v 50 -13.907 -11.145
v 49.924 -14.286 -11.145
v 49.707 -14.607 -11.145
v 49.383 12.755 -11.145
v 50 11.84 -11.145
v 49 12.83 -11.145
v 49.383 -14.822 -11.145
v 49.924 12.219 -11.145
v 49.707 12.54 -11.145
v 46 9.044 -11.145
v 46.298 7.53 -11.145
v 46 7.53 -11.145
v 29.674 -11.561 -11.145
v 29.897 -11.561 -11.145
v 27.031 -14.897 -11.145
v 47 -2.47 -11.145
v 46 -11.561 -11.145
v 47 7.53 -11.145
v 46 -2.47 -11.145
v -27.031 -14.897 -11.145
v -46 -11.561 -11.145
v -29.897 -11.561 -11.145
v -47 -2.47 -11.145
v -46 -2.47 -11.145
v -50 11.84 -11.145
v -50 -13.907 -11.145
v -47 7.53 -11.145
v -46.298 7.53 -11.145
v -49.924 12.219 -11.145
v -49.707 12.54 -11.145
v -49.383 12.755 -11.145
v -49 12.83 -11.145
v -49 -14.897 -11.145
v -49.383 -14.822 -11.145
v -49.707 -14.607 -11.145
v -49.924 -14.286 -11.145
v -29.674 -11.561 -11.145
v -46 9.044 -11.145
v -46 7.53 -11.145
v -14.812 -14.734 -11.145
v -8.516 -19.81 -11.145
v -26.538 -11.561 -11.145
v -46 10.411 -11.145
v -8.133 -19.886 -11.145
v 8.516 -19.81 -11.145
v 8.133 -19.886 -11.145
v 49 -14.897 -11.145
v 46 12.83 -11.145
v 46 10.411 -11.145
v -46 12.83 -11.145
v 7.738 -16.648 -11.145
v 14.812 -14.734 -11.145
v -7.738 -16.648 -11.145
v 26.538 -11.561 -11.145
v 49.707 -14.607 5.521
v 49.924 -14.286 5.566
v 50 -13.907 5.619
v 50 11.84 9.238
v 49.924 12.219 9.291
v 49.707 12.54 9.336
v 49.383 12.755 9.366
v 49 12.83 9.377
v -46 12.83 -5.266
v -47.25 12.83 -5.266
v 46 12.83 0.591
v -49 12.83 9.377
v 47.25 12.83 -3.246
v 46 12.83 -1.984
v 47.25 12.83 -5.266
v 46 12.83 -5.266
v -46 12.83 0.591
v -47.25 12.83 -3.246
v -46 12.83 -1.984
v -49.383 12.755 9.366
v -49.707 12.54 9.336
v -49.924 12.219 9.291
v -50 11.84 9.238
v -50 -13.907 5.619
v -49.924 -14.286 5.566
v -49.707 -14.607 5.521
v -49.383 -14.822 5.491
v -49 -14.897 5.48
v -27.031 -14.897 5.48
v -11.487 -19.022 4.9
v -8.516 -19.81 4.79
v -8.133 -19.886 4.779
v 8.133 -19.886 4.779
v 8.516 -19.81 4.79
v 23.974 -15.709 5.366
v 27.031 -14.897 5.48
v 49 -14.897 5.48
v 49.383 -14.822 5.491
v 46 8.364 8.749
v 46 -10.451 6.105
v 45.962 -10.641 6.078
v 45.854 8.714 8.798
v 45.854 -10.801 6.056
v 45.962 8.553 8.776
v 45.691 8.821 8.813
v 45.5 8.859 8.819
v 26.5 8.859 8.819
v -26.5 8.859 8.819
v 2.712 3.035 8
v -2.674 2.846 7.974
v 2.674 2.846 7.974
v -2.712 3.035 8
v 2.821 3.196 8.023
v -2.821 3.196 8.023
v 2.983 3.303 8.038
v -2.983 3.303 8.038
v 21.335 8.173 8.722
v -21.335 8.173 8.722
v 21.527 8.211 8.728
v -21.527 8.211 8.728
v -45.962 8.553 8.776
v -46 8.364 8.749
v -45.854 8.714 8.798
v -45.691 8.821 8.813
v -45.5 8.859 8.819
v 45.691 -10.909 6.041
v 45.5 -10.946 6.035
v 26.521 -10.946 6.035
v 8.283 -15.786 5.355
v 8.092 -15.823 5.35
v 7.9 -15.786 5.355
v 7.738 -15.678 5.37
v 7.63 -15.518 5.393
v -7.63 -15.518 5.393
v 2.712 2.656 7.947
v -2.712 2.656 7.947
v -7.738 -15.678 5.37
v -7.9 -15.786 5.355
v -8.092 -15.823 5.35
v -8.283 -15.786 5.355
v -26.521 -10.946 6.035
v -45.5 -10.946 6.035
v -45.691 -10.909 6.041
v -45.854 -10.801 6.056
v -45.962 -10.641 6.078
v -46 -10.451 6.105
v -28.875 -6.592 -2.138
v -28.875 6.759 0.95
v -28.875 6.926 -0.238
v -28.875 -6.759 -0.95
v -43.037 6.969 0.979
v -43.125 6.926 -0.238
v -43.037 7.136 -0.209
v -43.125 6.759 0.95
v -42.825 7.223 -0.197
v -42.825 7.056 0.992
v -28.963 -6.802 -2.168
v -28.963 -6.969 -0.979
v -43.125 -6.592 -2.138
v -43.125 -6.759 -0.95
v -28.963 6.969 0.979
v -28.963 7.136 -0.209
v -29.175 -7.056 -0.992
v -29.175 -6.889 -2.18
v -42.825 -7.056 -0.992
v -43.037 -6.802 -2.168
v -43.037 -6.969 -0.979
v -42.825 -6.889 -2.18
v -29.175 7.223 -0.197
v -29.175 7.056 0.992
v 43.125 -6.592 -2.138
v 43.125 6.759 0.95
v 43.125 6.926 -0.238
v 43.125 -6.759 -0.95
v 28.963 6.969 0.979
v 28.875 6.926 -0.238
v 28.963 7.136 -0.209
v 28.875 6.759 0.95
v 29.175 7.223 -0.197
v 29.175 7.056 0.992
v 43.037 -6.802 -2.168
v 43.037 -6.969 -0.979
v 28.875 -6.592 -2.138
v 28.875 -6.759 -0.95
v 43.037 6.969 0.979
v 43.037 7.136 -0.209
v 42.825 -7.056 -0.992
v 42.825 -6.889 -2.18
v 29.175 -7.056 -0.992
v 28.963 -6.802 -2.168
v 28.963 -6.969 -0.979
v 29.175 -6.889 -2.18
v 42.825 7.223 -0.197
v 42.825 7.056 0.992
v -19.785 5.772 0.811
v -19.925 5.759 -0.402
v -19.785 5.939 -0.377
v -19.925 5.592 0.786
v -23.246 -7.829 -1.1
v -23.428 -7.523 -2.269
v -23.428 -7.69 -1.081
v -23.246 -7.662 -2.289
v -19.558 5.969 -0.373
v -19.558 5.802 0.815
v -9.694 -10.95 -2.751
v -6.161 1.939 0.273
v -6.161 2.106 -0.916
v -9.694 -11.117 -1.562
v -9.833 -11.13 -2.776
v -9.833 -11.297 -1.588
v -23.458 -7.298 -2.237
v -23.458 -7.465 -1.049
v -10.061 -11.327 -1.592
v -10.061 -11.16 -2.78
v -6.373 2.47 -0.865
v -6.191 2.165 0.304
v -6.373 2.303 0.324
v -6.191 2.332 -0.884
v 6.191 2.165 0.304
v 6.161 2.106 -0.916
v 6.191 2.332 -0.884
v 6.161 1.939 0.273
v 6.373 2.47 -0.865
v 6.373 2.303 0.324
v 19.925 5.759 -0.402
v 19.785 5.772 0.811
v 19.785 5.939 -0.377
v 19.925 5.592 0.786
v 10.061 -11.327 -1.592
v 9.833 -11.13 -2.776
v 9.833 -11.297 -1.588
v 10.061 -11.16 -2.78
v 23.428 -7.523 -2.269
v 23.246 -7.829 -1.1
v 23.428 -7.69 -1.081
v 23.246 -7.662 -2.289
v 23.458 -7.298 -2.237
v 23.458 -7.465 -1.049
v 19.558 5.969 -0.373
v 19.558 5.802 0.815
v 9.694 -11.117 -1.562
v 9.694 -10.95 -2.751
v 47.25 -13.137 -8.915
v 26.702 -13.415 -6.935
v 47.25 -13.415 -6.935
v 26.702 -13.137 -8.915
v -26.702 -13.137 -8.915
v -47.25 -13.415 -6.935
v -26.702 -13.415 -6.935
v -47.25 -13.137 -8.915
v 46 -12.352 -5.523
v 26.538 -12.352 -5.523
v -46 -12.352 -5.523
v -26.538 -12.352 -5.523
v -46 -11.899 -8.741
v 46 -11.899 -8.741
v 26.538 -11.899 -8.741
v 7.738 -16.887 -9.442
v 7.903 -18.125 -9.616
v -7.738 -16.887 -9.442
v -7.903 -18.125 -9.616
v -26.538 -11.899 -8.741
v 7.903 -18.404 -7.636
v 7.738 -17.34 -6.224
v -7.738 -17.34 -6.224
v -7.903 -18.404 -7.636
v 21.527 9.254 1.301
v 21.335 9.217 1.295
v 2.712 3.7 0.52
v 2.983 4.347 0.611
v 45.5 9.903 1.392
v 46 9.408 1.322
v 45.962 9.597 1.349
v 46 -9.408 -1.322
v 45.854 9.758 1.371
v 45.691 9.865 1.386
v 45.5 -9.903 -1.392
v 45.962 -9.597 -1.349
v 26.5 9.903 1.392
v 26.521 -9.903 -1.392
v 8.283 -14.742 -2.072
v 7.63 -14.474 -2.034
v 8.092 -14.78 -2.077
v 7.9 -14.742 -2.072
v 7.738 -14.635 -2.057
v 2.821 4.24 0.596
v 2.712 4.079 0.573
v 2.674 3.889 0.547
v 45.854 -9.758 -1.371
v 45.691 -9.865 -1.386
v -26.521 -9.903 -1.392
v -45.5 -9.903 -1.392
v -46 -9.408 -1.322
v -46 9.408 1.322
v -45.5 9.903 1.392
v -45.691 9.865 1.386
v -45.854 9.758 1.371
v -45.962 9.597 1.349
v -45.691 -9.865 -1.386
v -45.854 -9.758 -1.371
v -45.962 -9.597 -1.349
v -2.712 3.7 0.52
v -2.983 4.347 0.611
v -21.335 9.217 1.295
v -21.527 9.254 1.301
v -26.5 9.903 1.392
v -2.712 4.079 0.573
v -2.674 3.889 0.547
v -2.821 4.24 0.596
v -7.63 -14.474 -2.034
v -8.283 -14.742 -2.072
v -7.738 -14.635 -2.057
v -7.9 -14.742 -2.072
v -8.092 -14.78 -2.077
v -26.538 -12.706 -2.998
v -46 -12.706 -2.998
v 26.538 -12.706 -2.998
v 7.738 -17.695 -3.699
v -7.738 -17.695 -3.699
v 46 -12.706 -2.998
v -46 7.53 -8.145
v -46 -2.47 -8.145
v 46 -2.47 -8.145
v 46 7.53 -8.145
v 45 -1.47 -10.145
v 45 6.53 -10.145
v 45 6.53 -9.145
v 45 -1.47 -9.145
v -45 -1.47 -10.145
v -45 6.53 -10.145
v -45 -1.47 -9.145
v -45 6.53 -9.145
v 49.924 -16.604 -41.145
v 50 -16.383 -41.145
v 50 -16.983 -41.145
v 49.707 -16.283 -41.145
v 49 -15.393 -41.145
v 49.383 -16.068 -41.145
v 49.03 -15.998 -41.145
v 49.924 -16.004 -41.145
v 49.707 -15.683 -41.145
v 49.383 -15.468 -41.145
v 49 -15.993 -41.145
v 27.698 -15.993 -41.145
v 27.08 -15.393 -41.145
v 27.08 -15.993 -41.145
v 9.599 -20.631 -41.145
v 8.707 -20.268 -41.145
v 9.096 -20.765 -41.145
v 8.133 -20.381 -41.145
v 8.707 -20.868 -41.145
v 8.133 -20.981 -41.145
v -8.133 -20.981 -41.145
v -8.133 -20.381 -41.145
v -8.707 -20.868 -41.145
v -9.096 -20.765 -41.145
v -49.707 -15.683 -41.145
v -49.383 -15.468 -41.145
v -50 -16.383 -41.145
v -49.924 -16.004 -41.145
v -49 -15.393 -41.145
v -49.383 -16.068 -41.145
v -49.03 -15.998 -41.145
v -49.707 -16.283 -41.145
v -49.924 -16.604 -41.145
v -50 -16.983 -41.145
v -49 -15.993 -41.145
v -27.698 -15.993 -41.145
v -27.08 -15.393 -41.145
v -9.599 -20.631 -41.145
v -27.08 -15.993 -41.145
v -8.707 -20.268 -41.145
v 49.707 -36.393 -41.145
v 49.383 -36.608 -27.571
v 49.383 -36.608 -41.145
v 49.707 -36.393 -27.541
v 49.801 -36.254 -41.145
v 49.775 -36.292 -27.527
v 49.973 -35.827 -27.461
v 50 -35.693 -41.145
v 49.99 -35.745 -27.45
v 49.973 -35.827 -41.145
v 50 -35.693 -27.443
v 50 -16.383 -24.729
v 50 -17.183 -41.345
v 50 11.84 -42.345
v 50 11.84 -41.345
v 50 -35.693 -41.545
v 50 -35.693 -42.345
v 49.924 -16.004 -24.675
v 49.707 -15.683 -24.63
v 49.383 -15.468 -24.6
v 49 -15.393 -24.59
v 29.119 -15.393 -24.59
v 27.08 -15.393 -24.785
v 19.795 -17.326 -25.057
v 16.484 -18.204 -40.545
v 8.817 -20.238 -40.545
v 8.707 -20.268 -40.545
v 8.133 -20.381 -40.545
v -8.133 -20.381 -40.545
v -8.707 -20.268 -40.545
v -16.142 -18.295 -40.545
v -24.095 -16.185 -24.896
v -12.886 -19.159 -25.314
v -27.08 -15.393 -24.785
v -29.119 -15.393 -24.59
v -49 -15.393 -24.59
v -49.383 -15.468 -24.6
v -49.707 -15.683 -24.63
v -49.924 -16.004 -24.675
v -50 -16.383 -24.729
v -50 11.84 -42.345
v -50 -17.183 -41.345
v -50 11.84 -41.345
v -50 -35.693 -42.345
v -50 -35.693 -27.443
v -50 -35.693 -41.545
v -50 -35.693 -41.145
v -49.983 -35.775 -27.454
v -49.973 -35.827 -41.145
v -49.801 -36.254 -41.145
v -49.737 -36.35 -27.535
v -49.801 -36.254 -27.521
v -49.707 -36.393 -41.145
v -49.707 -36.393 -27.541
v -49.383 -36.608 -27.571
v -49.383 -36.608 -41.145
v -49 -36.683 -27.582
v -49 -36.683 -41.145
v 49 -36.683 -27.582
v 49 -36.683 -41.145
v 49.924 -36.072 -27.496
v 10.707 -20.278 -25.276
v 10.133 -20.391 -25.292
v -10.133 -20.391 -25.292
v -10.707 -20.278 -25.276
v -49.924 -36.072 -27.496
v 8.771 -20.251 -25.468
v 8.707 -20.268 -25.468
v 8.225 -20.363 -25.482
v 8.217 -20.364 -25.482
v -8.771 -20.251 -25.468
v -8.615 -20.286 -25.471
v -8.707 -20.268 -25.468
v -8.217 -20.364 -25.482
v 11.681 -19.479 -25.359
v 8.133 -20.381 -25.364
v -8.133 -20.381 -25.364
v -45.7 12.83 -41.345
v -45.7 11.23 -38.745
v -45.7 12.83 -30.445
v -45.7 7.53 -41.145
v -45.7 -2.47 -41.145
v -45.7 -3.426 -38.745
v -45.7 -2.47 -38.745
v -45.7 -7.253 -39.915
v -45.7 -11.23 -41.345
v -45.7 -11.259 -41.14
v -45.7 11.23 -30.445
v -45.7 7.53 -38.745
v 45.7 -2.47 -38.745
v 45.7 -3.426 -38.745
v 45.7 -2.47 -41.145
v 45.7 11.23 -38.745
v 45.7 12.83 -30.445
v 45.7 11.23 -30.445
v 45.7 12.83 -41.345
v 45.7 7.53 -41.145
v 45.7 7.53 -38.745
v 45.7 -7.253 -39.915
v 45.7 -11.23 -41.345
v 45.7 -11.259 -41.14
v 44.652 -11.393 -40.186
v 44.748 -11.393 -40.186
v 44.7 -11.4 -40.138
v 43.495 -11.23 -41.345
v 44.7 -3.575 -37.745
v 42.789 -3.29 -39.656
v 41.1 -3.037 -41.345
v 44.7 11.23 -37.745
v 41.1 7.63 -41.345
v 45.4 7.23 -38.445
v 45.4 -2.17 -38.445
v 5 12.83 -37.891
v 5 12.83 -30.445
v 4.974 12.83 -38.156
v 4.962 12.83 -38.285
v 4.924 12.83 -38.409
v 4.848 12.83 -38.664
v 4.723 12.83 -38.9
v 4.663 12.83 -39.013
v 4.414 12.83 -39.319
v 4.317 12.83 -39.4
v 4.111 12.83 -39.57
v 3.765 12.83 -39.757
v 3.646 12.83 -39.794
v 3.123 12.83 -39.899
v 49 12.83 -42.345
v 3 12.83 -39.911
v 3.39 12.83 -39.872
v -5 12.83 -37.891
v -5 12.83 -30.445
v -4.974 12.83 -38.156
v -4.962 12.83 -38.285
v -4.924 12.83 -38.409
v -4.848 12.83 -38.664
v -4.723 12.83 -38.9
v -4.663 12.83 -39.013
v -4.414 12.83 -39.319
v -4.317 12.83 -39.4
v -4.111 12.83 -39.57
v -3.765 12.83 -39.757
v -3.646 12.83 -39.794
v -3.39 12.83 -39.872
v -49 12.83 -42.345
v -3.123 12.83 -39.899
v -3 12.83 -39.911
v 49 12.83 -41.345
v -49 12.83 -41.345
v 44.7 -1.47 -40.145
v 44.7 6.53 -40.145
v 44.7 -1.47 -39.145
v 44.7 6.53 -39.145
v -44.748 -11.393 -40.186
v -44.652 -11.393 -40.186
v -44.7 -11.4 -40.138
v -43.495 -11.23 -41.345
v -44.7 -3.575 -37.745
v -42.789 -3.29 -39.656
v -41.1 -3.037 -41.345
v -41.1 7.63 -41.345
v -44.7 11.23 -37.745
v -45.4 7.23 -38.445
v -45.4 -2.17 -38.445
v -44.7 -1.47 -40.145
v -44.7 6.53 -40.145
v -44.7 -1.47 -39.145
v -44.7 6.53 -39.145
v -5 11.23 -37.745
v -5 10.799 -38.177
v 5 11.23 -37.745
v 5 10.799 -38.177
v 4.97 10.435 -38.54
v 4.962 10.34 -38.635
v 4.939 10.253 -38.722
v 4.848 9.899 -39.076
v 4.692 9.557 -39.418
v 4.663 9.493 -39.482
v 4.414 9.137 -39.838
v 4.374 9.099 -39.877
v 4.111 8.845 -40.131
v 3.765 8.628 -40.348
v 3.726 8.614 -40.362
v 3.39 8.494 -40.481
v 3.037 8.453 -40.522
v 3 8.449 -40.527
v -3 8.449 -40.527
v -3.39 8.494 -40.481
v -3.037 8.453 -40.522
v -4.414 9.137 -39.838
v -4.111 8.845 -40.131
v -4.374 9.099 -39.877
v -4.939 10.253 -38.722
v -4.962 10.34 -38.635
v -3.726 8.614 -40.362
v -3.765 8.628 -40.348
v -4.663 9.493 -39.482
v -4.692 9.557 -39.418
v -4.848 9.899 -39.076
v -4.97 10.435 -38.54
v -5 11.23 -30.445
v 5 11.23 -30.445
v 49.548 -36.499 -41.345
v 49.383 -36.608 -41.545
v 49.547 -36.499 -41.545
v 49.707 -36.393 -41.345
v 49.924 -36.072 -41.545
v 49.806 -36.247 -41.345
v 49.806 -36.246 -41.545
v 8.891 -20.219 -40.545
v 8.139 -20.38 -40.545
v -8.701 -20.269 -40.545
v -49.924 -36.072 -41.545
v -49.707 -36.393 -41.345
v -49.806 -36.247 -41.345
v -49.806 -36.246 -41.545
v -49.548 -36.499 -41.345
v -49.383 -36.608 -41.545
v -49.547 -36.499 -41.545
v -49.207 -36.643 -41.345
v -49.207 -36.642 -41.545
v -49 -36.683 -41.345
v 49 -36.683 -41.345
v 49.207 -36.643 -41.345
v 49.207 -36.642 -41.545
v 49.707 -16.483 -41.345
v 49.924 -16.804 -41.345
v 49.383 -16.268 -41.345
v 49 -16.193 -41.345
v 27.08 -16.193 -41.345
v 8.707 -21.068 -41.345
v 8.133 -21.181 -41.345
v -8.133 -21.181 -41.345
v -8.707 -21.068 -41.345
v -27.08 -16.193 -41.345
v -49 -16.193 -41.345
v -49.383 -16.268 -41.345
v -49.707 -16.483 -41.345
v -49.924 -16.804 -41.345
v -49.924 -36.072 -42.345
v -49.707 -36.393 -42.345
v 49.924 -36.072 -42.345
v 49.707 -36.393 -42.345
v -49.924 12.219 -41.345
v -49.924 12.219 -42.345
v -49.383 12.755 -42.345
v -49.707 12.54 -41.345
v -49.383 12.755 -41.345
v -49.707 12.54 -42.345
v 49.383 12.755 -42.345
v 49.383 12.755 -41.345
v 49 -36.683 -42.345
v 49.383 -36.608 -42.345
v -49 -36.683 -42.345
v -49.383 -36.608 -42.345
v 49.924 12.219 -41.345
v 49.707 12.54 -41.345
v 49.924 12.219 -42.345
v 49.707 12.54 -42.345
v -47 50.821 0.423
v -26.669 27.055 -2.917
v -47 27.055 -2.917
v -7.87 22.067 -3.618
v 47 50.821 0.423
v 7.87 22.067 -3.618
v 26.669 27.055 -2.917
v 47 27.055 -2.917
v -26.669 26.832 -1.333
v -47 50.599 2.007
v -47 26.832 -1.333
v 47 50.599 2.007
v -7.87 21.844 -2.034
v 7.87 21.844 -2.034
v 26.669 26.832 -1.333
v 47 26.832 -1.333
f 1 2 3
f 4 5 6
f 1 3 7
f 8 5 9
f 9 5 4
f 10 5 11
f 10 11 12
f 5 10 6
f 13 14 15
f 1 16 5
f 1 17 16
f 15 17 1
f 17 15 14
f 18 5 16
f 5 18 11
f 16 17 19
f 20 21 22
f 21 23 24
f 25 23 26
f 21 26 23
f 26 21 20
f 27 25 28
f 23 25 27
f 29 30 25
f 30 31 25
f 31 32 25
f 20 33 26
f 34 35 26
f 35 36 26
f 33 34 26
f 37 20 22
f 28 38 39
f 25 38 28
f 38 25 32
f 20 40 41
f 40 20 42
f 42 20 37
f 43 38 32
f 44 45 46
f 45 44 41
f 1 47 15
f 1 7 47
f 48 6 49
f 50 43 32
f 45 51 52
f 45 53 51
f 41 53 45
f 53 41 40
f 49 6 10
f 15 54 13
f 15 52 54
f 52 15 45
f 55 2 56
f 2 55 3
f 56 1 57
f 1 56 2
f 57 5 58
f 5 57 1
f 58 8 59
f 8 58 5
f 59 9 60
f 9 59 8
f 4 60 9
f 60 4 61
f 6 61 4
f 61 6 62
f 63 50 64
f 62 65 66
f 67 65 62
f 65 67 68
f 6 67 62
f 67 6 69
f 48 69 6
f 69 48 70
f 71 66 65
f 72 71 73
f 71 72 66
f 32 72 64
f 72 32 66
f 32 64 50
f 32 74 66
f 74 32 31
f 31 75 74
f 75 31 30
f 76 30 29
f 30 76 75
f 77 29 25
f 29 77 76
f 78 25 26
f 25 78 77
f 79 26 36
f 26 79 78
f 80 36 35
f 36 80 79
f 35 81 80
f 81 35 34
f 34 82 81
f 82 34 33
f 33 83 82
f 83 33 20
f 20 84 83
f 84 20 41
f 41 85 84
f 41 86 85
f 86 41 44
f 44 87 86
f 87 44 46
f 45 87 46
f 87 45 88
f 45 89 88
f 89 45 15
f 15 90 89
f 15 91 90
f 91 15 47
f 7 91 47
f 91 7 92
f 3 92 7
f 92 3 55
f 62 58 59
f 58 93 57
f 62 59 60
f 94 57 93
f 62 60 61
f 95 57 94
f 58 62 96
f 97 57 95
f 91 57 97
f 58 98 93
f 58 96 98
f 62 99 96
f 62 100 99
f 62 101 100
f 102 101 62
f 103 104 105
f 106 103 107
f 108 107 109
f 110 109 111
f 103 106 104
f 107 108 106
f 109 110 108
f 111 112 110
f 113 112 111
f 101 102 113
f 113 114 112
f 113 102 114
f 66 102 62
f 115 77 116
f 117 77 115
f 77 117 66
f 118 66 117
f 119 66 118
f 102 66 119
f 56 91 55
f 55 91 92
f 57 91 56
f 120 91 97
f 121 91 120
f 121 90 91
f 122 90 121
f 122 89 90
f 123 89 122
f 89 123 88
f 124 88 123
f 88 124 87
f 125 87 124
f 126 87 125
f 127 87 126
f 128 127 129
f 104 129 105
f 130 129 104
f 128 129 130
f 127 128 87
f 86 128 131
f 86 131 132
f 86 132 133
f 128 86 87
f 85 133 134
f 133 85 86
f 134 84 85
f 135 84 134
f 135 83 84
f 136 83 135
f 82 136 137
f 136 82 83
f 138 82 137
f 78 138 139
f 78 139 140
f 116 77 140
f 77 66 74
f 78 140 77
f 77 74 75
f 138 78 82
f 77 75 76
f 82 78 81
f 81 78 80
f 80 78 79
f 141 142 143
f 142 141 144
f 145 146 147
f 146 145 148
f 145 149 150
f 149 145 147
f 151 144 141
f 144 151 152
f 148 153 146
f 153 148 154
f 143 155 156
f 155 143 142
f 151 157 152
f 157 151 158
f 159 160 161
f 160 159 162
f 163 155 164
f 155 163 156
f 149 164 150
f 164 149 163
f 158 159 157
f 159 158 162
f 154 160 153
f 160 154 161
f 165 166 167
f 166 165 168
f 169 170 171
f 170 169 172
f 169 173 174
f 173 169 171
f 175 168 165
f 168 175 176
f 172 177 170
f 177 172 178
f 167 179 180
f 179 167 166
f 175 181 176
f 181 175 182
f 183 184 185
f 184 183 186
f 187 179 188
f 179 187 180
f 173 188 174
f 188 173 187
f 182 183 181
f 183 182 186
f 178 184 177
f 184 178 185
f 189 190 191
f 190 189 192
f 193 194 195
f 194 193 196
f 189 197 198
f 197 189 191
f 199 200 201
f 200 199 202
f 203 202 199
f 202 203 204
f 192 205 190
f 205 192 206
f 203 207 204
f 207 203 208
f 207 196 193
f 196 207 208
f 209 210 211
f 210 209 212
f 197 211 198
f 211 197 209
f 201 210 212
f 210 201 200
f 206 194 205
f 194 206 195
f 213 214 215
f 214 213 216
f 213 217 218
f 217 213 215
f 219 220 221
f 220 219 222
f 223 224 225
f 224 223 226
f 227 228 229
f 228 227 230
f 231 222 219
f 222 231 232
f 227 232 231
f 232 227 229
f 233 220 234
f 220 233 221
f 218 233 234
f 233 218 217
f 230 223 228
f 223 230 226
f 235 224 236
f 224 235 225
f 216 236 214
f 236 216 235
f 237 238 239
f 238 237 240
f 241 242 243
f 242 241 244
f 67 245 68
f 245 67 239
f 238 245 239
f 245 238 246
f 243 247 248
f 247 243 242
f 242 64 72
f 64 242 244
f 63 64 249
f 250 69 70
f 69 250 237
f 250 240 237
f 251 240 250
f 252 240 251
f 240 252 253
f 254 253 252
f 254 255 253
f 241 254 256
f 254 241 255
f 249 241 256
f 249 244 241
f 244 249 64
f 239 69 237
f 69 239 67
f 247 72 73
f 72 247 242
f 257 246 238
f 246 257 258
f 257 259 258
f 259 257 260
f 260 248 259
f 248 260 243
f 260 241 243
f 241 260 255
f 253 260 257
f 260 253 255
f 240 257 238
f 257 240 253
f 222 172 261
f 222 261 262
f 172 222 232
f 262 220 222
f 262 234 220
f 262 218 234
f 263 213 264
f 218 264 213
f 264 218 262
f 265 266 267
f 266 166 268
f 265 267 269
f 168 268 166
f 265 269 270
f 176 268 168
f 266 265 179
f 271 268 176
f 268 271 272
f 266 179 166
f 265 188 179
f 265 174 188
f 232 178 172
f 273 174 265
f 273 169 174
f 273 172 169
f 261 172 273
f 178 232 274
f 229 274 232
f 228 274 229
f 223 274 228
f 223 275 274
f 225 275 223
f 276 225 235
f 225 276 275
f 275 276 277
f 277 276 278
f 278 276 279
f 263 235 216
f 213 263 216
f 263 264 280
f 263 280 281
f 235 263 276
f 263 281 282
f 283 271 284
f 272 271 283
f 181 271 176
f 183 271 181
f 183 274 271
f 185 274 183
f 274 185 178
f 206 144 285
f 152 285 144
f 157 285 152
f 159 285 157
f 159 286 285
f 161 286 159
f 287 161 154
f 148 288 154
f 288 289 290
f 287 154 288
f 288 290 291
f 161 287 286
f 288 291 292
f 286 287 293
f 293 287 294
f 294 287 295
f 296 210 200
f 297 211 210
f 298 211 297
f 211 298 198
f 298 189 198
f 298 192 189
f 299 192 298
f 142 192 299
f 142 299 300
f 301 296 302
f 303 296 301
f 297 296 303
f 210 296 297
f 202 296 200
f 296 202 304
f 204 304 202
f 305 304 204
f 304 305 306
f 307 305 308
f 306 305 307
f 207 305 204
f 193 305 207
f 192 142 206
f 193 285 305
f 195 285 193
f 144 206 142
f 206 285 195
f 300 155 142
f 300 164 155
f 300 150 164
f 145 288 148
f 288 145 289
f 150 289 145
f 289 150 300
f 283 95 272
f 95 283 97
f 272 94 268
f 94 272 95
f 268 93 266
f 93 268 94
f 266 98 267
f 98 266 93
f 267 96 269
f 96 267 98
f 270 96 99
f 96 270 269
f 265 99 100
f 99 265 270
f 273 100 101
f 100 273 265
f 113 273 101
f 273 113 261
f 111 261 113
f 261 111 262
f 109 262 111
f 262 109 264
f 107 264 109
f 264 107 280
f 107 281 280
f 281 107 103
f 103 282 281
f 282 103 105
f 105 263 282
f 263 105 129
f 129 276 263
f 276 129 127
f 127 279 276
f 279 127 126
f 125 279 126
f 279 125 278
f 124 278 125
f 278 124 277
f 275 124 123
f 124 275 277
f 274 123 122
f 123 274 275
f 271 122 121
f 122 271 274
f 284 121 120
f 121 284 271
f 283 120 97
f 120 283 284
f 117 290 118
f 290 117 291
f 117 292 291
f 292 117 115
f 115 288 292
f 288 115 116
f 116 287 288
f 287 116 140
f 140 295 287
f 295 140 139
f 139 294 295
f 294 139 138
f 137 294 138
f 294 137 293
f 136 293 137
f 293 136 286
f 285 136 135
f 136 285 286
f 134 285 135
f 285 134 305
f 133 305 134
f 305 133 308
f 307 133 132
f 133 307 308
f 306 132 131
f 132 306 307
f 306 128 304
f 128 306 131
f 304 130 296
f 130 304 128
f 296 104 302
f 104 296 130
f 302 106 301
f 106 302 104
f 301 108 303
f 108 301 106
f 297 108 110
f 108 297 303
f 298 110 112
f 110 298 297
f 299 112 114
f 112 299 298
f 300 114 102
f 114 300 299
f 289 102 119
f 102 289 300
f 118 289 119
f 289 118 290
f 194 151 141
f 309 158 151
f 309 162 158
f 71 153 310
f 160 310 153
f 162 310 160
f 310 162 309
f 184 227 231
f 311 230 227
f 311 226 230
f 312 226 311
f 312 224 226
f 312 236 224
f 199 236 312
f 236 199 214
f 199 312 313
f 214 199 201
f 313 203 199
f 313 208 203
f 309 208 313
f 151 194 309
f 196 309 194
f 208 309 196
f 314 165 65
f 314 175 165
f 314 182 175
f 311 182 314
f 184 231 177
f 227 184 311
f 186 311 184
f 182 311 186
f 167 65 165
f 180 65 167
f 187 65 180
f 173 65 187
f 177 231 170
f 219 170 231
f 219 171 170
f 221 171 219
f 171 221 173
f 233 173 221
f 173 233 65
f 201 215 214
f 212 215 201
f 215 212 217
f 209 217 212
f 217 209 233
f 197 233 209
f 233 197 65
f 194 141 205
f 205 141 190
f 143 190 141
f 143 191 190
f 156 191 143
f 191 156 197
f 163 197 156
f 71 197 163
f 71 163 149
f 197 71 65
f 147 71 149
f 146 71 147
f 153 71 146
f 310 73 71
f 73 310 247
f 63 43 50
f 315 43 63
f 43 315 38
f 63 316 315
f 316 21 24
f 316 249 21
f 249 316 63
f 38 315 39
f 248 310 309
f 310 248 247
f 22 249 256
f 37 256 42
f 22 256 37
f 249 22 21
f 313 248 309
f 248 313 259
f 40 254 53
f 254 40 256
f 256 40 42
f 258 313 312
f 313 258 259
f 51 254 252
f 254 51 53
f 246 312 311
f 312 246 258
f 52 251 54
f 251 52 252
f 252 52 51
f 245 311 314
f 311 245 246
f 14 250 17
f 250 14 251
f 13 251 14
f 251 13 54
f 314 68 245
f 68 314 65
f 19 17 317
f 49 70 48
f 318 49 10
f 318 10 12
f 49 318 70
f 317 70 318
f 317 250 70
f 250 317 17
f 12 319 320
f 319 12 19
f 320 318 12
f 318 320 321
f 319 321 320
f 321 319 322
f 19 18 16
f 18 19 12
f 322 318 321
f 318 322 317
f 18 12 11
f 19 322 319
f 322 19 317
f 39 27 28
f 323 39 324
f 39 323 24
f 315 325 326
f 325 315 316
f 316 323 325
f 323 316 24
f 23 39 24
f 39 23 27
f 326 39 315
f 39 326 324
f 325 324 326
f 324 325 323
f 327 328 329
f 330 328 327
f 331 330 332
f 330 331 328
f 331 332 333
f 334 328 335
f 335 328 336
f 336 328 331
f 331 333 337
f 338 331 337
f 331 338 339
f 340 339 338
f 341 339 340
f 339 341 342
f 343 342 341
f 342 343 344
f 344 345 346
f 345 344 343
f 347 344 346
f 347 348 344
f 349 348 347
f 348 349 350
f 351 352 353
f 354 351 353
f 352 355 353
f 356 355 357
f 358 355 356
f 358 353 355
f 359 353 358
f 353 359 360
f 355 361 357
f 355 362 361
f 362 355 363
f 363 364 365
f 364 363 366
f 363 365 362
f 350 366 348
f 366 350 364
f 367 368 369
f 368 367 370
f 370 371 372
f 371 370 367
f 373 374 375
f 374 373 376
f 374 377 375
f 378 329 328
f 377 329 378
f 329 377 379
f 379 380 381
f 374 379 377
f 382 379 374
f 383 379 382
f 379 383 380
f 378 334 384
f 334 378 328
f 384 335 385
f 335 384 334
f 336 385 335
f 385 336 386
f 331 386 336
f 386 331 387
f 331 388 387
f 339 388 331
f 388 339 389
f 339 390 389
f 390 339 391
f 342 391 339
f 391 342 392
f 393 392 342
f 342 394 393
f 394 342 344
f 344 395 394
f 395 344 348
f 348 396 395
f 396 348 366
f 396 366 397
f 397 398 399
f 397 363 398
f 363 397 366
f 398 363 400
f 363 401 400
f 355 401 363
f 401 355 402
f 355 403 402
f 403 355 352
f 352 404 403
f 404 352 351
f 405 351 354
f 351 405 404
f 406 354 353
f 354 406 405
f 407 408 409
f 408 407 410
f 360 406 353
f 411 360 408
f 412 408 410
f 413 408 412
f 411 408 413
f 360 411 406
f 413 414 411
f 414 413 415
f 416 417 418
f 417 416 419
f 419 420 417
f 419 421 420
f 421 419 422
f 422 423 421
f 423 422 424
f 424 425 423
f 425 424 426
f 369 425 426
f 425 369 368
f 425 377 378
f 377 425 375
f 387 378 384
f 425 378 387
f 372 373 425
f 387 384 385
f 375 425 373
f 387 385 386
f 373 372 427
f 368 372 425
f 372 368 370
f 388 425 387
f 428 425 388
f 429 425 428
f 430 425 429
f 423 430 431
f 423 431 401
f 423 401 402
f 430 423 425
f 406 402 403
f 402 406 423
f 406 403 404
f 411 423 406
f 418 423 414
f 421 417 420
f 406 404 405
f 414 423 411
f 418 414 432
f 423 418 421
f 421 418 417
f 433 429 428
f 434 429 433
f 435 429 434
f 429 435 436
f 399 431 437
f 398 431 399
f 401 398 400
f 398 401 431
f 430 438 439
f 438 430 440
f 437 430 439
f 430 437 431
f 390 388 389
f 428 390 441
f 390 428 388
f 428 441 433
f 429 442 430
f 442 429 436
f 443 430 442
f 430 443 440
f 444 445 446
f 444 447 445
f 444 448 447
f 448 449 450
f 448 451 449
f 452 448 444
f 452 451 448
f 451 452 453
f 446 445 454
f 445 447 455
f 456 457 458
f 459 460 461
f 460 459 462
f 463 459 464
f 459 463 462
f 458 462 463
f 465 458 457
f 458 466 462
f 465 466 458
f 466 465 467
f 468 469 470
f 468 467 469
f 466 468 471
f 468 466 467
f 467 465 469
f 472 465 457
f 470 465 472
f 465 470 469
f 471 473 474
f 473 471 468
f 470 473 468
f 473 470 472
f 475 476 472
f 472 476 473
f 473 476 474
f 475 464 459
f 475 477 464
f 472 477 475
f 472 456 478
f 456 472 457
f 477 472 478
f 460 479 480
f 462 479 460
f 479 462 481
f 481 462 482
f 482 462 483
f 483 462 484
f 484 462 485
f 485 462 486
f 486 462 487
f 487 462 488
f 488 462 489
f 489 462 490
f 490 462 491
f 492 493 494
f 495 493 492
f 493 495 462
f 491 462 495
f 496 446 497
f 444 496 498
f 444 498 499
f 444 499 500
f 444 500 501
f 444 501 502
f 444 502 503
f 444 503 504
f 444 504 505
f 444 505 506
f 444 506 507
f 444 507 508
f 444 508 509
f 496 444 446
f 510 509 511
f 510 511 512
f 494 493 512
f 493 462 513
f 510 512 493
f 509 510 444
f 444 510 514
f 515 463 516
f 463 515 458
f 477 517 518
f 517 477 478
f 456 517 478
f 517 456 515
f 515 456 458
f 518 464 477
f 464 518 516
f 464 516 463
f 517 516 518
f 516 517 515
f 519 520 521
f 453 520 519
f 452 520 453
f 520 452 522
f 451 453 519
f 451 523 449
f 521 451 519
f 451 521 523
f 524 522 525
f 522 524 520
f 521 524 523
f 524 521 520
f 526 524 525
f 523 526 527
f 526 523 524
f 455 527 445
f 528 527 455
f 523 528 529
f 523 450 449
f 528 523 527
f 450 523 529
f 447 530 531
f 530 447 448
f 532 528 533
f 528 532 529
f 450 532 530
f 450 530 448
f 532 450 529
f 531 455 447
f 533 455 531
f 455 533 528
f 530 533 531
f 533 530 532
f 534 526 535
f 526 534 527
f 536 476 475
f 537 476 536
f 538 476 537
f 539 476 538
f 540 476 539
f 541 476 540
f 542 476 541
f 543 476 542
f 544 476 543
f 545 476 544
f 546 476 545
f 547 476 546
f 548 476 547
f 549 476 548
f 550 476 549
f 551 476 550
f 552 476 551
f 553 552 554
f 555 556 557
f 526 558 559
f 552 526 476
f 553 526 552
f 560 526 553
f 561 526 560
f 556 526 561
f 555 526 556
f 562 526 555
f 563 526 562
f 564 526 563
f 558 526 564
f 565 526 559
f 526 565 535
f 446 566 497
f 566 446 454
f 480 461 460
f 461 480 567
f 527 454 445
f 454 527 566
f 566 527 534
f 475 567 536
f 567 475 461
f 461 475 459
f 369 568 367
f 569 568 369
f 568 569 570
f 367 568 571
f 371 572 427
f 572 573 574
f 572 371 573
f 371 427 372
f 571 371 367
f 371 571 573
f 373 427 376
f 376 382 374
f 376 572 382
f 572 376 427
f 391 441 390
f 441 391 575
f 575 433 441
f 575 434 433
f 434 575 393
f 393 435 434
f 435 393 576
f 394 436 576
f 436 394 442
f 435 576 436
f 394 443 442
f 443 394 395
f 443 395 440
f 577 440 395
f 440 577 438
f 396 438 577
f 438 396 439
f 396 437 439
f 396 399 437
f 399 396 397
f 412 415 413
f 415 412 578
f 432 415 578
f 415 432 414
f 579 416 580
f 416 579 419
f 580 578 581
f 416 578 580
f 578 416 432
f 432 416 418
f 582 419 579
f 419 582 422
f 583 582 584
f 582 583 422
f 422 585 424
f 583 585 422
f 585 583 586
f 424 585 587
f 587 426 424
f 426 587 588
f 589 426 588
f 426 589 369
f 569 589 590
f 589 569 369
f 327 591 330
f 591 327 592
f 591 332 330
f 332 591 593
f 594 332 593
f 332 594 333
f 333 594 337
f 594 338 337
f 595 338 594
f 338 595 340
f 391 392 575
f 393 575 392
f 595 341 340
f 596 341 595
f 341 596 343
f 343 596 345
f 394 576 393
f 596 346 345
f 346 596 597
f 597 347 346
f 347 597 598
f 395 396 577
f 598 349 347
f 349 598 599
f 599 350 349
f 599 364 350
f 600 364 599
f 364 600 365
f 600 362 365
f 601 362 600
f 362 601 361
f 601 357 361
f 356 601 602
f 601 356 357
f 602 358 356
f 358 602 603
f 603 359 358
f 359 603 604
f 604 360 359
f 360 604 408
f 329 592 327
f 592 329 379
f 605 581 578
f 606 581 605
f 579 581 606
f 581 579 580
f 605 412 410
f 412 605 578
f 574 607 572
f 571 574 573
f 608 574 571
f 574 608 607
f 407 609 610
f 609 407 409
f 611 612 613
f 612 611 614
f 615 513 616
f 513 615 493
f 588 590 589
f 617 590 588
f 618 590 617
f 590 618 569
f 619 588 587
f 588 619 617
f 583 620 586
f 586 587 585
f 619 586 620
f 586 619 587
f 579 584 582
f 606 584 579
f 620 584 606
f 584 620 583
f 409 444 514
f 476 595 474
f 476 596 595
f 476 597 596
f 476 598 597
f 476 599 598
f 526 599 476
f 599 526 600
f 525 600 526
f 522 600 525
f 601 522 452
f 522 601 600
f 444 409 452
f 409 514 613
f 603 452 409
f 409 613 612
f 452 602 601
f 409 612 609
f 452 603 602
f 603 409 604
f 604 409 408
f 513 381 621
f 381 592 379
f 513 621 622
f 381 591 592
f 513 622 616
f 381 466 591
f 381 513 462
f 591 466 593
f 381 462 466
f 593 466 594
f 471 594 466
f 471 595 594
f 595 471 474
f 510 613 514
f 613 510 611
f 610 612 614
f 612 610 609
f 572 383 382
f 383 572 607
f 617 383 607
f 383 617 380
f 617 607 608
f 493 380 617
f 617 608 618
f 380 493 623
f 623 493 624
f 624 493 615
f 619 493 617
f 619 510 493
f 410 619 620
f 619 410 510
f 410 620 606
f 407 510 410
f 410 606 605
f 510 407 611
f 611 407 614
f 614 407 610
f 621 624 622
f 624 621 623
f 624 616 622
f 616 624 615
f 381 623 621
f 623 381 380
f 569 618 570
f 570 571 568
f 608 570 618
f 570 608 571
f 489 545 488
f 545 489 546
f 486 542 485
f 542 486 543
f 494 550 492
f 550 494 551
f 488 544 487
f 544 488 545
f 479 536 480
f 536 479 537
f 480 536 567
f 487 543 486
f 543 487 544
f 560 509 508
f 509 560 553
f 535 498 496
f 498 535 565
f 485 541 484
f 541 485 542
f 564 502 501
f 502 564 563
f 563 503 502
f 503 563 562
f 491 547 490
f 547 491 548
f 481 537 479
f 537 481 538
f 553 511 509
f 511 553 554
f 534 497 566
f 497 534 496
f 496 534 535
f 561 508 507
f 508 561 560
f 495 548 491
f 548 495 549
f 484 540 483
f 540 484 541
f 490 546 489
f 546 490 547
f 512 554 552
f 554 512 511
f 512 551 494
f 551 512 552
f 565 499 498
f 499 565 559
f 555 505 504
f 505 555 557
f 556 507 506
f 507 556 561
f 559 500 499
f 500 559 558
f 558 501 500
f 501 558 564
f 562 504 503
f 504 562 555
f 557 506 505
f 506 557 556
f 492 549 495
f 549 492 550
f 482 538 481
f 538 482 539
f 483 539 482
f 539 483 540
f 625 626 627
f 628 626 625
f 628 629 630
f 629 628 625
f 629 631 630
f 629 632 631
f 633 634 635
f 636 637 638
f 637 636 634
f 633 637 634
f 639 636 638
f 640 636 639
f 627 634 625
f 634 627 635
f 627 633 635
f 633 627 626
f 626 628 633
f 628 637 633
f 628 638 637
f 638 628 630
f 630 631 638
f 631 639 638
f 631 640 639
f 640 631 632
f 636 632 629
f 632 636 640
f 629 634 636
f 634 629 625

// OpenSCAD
include <drink-me.scad>

pcb_dist = 40;

present() {
     case_3d();

     translate([0, 0, -30]) {
          rest_3d();
          base_3d();
     }
     
     translate([0, pcb_dist, pcb_dist * sin(typing_angle)]) {
          pcb_3d();
     }
}
